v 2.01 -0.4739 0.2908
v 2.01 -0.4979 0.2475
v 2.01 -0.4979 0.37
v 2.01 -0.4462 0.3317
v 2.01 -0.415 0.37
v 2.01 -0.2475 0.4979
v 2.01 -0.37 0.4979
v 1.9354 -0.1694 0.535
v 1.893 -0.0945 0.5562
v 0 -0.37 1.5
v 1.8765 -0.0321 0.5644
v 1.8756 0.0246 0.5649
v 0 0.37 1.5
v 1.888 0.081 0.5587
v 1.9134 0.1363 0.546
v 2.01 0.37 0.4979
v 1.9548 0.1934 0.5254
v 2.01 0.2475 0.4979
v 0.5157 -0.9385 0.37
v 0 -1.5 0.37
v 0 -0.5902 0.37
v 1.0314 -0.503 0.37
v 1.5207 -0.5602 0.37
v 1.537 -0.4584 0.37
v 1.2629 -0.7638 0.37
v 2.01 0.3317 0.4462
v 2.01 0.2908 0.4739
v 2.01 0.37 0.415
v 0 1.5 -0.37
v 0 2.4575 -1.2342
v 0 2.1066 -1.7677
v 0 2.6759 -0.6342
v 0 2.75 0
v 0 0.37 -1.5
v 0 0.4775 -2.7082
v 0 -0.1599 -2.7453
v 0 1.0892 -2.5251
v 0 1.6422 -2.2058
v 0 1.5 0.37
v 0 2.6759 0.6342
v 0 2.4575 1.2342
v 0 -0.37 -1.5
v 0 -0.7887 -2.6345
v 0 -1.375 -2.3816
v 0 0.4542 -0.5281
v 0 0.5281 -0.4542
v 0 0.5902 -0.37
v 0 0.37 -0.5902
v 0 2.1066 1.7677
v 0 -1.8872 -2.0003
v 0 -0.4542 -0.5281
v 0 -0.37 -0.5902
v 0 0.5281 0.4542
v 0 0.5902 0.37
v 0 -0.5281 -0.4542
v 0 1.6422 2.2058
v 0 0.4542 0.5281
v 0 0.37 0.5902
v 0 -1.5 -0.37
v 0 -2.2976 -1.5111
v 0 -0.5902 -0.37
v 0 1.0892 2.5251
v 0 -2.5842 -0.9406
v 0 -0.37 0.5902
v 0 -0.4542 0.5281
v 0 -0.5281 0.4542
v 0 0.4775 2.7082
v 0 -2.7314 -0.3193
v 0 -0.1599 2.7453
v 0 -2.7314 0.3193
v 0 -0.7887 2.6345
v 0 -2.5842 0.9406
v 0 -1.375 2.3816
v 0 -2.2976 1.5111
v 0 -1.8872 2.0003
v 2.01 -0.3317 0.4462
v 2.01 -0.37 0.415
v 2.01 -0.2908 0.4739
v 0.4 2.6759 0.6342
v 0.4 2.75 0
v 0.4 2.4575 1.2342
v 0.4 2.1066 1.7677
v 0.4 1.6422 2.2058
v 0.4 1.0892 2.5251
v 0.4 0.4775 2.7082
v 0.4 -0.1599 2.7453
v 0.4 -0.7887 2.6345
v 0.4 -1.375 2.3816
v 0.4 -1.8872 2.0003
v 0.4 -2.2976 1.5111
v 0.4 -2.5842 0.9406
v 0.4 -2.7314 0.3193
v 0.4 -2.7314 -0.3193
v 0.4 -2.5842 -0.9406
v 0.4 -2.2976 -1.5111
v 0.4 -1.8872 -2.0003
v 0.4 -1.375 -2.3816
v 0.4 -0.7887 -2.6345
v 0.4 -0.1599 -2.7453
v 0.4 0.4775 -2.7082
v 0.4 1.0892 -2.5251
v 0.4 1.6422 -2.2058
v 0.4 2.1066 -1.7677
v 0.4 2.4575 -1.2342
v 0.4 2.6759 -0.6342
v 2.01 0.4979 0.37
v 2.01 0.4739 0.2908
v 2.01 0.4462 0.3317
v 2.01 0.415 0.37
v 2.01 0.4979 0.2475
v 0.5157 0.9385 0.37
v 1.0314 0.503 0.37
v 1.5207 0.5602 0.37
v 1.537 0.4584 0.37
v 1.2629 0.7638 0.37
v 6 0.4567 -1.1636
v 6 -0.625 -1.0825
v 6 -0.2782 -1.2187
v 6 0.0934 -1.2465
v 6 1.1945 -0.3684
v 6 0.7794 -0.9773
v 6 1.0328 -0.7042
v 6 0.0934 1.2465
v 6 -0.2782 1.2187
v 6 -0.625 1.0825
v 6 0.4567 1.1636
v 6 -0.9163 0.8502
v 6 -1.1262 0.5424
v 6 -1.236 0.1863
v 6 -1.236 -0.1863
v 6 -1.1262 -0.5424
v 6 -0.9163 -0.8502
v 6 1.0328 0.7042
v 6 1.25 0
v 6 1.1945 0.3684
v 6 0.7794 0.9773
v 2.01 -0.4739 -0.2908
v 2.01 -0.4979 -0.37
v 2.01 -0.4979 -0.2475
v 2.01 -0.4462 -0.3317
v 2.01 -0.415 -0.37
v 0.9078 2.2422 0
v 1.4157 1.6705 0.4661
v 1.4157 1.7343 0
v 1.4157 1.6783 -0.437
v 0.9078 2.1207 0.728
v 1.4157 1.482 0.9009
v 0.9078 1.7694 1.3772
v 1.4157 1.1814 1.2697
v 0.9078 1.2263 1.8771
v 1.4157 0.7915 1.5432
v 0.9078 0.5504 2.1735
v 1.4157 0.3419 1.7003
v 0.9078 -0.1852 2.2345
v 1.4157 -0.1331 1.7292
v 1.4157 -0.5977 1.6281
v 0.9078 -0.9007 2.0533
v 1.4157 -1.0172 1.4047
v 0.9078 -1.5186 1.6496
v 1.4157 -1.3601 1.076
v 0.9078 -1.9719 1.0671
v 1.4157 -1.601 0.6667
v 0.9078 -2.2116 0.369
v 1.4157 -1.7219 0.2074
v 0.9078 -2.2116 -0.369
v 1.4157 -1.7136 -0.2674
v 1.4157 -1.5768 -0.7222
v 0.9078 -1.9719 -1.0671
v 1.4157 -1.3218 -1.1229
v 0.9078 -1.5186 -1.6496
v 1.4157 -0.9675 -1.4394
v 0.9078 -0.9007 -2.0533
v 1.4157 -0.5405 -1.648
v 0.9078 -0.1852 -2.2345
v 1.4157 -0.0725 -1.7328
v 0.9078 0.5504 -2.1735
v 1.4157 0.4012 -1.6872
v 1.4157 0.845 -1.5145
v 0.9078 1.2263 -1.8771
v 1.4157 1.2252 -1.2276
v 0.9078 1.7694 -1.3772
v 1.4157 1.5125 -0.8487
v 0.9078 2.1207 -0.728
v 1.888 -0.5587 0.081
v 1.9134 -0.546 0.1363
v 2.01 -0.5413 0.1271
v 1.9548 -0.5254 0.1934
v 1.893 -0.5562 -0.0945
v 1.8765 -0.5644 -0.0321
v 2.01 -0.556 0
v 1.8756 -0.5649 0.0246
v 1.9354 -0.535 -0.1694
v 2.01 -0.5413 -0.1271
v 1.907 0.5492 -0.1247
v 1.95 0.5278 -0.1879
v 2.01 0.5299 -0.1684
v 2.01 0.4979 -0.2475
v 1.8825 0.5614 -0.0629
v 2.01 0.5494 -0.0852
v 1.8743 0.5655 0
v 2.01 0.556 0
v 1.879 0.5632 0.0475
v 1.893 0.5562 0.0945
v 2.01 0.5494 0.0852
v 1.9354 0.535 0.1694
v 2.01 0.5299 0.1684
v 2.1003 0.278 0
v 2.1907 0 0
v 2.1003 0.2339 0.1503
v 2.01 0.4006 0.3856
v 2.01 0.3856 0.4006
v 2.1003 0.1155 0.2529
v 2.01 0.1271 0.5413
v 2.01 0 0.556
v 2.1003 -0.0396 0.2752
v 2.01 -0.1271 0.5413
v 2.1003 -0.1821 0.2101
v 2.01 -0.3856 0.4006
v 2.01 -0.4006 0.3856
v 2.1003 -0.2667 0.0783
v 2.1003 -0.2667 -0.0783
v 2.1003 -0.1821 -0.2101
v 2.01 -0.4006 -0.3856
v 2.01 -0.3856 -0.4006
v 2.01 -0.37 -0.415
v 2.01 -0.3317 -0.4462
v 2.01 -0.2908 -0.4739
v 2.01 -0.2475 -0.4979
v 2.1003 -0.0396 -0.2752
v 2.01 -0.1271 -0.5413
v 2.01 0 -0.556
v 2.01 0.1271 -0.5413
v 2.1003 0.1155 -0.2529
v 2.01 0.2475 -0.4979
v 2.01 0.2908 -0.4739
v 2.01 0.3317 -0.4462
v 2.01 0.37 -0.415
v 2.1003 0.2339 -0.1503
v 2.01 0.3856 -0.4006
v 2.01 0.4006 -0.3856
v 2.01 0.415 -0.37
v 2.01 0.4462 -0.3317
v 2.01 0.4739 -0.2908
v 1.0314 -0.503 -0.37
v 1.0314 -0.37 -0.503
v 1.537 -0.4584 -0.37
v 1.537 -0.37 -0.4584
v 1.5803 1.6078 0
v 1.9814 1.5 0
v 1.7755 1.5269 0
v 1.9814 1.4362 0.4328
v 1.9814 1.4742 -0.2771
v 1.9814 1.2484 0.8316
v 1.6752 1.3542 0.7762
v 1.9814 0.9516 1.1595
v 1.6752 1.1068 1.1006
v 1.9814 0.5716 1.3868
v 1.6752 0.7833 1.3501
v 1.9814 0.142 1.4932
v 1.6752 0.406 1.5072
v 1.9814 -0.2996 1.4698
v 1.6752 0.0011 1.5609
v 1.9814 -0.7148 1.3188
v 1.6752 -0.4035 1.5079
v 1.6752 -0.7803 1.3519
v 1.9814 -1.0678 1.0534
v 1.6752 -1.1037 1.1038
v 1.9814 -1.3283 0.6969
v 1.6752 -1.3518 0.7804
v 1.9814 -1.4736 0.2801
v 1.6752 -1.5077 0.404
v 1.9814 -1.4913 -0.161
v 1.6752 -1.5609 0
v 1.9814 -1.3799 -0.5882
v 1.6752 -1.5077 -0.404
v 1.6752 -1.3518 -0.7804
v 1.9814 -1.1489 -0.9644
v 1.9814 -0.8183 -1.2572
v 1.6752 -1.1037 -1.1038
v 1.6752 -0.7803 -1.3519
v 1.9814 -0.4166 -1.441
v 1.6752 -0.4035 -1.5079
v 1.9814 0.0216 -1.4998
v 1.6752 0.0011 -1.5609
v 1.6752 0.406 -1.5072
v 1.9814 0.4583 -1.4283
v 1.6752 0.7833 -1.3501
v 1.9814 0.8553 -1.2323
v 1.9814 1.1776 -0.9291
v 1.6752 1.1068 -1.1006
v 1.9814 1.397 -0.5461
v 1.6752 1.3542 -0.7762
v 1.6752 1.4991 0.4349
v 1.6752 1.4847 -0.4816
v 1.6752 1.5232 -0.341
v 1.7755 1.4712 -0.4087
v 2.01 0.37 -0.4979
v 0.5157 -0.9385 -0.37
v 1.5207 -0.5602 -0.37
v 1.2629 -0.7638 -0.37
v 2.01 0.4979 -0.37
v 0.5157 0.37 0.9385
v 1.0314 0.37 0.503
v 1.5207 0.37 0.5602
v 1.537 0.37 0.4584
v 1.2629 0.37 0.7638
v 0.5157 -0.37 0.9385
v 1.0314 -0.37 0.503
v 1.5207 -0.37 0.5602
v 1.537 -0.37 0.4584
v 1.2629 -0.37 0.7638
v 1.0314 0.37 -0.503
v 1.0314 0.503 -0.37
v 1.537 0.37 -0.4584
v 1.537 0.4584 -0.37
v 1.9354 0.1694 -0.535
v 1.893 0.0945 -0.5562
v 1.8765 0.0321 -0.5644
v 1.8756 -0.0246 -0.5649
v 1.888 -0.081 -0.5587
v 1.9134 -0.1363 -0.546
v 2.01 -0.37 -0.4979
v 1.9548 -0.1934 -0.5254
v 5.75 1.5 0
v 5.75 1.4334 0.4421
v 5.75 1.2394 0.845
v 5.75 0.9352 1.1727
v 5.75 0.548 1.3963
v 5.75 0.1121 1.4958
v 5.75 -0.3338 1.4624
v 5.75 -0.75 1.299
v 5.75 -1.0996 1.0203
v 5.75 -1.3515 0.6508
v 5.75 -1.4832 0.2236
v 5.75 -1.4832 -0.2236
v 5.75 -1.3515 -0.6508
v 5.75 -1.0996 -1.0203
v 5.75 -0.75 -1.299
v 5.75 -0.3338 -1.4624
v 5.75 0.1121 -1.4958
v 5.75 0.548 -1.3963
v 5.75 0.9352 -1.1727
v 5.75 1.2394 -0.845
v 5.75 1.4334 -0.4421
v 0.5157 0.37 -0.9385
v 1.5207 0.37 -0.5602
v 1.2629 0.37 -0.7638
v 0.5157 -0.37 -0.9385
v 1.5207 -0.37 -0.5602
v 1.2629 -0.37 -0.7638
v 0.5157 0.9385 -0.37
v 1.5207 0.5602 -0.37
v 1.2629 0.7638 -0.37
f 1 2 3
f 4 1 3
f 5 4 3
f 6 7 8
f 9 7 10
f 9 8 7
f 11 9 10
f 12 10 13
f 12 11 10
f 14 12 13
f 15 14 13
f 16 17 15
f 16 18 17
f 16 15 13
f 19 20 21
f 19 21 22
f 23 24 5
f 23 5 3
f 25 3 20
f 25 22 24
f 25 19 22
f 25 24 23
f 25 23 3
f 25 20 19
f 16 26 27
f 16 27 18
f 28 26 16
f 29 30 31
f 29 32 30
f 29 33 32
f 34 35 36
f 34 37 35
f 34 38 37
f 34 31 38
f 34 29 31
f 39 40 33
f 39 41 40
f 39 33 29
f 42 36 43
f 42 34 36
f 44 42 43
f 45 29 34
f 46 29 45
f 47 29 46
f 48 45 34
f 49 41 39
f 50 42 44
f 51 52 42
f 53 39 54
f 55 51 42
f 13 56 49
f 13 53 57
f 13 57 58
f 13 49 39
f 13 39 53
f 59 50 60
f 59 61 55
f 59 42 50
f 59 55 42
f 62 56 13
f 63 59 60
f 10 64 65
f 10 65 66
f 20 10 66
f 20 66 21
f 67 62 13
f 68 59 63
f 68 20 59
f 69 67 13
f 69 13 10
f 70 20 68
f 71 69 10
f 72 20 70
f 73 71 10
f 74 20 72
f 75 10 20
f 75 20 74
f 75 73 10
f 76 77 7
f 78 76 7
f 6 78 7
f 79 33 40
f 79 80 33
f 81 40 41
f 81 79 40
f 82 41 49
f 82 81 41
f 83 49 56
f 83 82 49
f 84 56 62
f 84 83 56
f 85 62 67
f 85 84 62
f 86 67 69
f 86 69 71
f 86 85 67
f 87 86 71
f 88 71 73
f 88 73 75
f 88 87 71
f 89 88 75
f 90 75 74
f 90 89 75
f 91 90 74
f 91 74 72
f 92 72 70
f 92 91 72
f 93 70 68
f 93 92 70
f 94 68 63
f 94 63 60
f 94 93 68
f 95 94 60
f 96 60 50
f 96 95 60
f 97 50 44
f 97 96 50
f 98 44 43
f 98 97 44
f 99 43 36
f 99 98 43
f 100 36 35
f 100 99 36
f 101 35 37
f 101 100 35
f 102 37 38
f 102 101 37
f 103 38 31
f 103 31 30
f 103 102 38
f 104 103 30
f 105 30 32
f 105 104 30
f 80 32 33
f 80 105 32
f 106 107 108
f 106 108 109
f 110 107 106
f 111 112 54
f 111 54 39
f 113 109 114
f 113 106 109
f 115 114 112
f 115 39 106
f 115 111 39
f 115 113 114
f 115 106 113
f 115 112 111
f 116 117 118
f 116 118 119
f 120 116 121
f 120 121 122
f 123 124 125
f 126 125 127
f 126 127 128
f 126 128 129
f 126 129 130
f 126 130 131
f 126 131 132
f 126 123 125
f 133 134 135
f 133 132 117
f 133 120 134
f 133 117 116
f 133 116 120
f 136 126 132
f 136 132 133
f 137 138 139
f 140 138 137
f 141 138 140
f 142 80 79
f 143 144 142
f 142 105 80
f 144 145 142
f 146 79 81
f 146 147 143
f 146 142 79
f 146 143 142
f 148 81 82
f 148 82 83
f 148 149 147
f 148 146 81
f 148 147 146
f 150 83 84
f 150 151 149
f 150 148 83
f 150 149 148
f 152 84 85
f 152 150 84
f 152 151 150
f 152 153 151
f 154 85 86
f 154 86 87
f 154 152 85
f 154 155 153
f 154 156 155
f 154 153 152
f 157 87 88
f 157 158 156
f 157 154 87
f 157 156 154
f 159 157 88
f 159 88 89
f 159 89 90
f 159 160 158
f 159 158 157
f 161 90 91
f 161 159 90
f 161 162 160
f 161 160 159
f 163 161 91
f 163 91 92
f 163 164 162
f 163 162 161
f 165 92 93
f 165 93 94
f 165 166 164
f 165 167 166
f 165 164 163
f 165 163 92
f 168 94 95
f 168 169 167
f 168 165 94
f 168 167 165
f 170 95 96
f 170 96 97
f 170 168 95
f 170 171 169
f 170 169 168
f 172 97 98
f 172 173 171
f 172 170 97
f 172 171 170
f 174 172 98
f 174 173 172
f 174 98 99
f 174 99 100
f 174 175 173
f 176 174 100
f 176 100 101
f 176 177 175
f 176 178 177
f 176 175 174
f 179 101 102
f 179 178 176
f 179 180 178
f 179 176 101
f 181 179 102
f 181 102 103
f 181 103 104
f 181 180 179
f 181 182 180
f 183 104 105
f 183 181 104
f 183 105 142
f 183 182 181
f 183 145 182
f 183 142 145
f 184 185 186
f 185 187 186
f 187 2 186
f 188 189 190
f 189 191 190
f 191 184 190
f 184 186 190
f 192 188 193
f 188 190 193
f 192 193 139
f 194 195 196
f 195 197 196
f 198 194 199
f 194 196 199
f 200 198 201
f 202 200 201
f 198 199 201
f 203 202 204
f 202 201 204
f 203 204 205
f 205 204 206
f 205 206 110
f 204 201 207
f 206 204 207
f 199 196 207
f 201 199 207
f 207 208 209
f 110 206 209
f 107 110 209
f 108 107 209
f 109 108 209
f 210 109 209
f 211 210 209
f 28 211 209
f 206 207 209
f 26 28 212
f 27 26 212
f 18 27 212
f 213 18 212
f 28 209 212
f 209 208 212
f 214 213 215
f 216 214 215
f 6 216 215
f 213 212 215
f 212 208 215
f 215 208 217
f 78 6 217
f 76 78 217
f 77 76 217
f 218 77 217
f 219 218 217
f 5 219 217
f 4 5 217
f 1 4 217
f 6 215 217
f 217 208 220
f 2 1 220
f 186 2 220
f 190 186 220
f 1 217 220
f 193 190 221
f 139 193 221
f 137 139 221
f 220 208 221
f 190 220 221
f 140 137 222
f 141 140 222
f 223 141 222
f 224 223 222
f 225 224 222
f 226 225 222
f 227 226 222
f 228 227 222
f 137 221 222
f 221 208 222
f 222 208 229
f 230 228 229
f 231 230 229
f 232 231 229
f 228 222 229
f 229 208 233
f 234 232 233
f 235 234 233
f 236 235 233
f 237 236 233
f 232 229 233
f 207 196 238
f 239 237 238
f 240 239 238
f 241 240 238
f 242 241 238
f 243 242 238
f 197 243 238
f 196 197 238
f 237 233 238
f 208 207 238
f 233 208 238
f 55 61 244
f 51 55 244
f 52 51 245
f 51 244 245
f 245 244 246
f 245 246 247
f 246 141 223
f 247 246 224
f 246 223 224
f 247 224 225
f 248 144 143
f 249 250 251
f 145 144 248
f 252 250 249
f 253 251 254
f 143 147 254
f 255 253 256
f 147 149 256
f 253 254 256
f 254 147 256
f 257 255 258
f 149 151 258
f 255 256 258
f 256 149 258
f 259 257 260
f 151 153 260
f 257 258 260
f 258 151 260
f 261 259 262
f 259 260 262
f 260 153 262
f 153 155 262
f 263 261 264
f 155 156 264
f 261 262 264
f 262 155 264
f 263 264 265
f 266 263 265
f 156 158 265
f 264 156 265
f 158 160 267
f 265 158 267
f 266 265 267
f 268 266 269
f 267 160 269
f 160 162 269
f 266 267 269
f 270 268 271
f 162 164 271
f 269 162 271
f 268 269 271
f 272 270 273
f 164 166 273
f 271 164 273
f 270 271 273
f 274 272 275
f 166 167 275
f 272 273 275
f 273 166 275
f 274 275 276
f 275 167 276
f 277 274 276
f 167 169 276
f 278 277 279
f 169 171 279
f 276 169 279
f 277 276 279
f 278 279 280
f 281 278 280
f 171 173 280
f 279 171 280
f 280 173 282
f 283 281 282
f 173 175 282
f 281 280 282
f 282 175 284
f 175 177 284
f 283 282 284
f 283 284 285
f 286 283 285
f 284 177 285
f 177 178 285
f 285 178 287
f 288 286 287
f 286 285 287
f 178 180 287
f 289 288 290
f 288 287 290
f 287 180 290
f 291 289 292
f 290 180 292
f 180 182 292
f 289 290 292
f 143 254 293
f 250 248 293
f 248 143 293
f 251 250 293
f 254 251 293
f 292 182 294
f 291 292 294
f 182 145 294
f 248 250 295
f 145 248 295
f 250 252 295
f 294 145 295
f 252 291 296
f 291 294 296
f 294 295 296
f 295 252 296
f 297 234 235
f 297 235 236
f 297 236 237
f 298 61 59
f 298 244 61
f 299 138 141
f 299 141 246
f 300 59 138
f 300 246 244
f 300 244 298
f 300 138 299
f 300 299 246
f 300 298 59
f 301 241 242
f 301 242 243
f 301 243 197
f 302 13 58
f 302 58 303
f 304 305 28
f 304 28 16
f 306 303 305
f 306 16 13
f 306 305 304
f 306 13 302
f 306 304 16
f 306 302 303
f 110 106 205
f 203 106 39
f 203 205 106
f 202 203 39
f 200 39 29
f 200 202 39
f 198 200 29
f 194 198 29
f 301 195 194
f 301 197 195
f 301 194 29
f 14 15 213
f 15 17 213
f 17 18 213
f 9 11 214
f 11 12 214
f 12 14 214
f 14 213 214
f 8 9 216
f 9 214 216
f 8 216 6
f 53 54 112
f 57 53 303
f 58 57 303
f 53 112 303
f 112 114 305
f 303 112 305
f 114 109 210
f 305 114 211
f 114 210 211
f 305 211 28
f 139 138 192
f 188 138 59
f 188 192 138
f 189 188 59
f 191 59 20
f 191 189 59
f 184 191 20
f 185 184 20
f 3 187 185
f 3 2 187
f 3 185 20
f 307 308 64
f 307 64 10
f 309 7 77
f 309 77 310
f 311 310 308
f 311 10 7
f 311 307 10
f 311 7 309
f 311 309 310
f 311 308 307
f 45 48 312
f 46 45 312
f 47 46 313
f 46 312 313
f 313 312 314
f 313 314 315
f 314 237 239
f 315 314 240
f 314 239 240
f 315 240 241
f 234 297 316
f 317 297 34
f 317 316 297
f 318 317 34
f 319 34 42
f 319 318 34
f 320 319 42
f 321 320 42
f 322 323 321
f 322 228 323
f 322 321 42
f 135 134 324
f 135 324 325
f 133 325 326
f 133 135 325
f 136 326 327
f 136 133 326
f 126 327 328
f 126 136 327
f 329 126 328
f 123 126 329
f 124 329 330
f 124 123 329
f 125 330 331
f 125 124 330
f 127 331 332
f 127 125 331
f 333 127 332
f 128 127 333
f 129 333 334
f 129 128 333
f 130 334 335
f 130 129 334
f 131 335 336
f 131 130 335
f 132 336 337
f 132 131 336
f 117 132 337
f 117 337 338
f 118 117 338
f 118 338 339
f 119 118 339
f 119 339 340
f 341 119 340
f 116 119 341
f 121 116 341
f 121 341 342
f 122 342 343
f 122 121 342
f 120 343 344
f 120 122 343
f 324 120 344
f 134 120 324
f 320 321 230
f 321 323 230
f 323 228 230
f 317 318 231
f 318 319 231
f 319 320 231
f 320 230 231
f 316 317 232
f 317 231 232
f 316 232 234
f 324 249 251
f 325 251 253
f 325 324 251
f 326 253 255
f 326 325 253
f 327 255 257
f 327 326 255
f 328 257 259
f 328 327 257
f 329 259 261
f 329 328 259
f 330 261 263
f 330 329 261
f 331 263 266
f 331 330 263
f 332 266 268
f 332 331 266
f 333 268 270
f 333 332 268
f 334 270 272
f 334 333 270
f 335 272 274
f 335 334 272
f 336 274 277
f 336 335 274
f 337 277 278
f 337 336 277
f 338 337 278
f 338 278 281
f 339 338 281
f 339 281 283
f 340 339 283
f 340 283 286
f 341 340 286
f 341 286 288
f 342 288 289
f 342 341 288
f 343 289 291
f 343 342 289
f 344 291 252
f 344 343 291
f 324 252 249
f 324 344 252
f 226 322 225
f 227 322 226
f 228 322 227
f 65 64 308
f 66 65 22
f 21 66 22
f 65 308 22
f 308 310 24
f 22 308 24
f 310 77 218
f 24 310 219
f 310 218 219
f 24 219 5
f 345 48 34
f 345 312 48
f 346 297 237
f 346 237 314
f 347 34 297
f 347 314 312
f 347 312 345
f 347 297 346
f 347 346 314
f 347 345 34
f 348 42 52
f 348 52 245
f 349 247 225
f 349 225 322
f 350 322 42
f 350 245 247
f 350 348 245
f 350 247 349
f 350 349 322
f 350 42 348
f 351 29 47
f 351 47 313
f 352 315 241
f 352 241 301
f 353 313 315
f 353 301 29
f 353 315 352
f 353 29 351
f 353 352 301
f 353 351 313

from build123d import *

# Parameters (mm, degrees)
FILLET1_R     = 0.8
SKETCH3_W     = 0.74
SKETCH3_H     = 3
SKETCH4_W     = 0.74
SKETCH4_H     = 0.995702004
RECPAT_COUNT  = 2
RECPAT_ANGLE  = 90
CHANFRO1_SIZE = 0.25


with BuildPart() as part:
    # BodySke → Base-Revolve (revolve)
    with BuildSketch(Plane.XY):
        Polygon((0, 0), (0, 2.75), (0.4, 2.75), (1.65, 1.5), (6, 1.5), (6, 0), align=None)
    revolve(axis=Axis((-6.35, 0, 0), (1, 0, 0)))

    # Fillet1
    fillet1_edges = [part.edges().sort_by_distance(p)[0] for p in [
        (1.65, -1.5, 0),
    ]]
    fillet(fillet1_edges, radius=FILLET1_R)

    # Sketch3 → Recess section 0
    with BuildSketch(Plane.ZY):
        Rectangle(SKETCH3_W, SKETCH3_H)
    # Sketch4 → Recess section 1
    with BuildSketch(Plane.ZY.offset(-2.01)):
        Rectangle(SKETCH4_W, SKETCH4_H)
    recess = loft(mode=Mode.SUBTRACT)

    # RecPat: Recess ×2 about axis
    recpat_axis = Axis((0, 0, 0), (1, 0, 0))
    for i in range(1, RECPAT_COUNT):
        add(recess.rotate(recpat_axis, i * RECPAT_ANGLE / (RECPAT_COUNT - 1)), mode=Mode.SUBTRACT)

    # RecCorSke → RecessCore (revolve, cut)
    with BuildSketch(Plane.XY):
        Polygon((0, 0), (0, 0.696552892), (2.01, 0.556), (2.190655351, 0), align=None)
    revolve(axis=Axis((-3.175, 0, 0), (1, 0, 0)), mode=Mode.SUBTRACT)

    # Chanfro1
    chanfro1_edges = [part.edges().sort_by_distance(p)[0] for p in [
        (6, -1.5, 0),
    ]]
    chamfer(chanfro1_edges, length=CHANFRO1_SIZE)


solid = part.part
